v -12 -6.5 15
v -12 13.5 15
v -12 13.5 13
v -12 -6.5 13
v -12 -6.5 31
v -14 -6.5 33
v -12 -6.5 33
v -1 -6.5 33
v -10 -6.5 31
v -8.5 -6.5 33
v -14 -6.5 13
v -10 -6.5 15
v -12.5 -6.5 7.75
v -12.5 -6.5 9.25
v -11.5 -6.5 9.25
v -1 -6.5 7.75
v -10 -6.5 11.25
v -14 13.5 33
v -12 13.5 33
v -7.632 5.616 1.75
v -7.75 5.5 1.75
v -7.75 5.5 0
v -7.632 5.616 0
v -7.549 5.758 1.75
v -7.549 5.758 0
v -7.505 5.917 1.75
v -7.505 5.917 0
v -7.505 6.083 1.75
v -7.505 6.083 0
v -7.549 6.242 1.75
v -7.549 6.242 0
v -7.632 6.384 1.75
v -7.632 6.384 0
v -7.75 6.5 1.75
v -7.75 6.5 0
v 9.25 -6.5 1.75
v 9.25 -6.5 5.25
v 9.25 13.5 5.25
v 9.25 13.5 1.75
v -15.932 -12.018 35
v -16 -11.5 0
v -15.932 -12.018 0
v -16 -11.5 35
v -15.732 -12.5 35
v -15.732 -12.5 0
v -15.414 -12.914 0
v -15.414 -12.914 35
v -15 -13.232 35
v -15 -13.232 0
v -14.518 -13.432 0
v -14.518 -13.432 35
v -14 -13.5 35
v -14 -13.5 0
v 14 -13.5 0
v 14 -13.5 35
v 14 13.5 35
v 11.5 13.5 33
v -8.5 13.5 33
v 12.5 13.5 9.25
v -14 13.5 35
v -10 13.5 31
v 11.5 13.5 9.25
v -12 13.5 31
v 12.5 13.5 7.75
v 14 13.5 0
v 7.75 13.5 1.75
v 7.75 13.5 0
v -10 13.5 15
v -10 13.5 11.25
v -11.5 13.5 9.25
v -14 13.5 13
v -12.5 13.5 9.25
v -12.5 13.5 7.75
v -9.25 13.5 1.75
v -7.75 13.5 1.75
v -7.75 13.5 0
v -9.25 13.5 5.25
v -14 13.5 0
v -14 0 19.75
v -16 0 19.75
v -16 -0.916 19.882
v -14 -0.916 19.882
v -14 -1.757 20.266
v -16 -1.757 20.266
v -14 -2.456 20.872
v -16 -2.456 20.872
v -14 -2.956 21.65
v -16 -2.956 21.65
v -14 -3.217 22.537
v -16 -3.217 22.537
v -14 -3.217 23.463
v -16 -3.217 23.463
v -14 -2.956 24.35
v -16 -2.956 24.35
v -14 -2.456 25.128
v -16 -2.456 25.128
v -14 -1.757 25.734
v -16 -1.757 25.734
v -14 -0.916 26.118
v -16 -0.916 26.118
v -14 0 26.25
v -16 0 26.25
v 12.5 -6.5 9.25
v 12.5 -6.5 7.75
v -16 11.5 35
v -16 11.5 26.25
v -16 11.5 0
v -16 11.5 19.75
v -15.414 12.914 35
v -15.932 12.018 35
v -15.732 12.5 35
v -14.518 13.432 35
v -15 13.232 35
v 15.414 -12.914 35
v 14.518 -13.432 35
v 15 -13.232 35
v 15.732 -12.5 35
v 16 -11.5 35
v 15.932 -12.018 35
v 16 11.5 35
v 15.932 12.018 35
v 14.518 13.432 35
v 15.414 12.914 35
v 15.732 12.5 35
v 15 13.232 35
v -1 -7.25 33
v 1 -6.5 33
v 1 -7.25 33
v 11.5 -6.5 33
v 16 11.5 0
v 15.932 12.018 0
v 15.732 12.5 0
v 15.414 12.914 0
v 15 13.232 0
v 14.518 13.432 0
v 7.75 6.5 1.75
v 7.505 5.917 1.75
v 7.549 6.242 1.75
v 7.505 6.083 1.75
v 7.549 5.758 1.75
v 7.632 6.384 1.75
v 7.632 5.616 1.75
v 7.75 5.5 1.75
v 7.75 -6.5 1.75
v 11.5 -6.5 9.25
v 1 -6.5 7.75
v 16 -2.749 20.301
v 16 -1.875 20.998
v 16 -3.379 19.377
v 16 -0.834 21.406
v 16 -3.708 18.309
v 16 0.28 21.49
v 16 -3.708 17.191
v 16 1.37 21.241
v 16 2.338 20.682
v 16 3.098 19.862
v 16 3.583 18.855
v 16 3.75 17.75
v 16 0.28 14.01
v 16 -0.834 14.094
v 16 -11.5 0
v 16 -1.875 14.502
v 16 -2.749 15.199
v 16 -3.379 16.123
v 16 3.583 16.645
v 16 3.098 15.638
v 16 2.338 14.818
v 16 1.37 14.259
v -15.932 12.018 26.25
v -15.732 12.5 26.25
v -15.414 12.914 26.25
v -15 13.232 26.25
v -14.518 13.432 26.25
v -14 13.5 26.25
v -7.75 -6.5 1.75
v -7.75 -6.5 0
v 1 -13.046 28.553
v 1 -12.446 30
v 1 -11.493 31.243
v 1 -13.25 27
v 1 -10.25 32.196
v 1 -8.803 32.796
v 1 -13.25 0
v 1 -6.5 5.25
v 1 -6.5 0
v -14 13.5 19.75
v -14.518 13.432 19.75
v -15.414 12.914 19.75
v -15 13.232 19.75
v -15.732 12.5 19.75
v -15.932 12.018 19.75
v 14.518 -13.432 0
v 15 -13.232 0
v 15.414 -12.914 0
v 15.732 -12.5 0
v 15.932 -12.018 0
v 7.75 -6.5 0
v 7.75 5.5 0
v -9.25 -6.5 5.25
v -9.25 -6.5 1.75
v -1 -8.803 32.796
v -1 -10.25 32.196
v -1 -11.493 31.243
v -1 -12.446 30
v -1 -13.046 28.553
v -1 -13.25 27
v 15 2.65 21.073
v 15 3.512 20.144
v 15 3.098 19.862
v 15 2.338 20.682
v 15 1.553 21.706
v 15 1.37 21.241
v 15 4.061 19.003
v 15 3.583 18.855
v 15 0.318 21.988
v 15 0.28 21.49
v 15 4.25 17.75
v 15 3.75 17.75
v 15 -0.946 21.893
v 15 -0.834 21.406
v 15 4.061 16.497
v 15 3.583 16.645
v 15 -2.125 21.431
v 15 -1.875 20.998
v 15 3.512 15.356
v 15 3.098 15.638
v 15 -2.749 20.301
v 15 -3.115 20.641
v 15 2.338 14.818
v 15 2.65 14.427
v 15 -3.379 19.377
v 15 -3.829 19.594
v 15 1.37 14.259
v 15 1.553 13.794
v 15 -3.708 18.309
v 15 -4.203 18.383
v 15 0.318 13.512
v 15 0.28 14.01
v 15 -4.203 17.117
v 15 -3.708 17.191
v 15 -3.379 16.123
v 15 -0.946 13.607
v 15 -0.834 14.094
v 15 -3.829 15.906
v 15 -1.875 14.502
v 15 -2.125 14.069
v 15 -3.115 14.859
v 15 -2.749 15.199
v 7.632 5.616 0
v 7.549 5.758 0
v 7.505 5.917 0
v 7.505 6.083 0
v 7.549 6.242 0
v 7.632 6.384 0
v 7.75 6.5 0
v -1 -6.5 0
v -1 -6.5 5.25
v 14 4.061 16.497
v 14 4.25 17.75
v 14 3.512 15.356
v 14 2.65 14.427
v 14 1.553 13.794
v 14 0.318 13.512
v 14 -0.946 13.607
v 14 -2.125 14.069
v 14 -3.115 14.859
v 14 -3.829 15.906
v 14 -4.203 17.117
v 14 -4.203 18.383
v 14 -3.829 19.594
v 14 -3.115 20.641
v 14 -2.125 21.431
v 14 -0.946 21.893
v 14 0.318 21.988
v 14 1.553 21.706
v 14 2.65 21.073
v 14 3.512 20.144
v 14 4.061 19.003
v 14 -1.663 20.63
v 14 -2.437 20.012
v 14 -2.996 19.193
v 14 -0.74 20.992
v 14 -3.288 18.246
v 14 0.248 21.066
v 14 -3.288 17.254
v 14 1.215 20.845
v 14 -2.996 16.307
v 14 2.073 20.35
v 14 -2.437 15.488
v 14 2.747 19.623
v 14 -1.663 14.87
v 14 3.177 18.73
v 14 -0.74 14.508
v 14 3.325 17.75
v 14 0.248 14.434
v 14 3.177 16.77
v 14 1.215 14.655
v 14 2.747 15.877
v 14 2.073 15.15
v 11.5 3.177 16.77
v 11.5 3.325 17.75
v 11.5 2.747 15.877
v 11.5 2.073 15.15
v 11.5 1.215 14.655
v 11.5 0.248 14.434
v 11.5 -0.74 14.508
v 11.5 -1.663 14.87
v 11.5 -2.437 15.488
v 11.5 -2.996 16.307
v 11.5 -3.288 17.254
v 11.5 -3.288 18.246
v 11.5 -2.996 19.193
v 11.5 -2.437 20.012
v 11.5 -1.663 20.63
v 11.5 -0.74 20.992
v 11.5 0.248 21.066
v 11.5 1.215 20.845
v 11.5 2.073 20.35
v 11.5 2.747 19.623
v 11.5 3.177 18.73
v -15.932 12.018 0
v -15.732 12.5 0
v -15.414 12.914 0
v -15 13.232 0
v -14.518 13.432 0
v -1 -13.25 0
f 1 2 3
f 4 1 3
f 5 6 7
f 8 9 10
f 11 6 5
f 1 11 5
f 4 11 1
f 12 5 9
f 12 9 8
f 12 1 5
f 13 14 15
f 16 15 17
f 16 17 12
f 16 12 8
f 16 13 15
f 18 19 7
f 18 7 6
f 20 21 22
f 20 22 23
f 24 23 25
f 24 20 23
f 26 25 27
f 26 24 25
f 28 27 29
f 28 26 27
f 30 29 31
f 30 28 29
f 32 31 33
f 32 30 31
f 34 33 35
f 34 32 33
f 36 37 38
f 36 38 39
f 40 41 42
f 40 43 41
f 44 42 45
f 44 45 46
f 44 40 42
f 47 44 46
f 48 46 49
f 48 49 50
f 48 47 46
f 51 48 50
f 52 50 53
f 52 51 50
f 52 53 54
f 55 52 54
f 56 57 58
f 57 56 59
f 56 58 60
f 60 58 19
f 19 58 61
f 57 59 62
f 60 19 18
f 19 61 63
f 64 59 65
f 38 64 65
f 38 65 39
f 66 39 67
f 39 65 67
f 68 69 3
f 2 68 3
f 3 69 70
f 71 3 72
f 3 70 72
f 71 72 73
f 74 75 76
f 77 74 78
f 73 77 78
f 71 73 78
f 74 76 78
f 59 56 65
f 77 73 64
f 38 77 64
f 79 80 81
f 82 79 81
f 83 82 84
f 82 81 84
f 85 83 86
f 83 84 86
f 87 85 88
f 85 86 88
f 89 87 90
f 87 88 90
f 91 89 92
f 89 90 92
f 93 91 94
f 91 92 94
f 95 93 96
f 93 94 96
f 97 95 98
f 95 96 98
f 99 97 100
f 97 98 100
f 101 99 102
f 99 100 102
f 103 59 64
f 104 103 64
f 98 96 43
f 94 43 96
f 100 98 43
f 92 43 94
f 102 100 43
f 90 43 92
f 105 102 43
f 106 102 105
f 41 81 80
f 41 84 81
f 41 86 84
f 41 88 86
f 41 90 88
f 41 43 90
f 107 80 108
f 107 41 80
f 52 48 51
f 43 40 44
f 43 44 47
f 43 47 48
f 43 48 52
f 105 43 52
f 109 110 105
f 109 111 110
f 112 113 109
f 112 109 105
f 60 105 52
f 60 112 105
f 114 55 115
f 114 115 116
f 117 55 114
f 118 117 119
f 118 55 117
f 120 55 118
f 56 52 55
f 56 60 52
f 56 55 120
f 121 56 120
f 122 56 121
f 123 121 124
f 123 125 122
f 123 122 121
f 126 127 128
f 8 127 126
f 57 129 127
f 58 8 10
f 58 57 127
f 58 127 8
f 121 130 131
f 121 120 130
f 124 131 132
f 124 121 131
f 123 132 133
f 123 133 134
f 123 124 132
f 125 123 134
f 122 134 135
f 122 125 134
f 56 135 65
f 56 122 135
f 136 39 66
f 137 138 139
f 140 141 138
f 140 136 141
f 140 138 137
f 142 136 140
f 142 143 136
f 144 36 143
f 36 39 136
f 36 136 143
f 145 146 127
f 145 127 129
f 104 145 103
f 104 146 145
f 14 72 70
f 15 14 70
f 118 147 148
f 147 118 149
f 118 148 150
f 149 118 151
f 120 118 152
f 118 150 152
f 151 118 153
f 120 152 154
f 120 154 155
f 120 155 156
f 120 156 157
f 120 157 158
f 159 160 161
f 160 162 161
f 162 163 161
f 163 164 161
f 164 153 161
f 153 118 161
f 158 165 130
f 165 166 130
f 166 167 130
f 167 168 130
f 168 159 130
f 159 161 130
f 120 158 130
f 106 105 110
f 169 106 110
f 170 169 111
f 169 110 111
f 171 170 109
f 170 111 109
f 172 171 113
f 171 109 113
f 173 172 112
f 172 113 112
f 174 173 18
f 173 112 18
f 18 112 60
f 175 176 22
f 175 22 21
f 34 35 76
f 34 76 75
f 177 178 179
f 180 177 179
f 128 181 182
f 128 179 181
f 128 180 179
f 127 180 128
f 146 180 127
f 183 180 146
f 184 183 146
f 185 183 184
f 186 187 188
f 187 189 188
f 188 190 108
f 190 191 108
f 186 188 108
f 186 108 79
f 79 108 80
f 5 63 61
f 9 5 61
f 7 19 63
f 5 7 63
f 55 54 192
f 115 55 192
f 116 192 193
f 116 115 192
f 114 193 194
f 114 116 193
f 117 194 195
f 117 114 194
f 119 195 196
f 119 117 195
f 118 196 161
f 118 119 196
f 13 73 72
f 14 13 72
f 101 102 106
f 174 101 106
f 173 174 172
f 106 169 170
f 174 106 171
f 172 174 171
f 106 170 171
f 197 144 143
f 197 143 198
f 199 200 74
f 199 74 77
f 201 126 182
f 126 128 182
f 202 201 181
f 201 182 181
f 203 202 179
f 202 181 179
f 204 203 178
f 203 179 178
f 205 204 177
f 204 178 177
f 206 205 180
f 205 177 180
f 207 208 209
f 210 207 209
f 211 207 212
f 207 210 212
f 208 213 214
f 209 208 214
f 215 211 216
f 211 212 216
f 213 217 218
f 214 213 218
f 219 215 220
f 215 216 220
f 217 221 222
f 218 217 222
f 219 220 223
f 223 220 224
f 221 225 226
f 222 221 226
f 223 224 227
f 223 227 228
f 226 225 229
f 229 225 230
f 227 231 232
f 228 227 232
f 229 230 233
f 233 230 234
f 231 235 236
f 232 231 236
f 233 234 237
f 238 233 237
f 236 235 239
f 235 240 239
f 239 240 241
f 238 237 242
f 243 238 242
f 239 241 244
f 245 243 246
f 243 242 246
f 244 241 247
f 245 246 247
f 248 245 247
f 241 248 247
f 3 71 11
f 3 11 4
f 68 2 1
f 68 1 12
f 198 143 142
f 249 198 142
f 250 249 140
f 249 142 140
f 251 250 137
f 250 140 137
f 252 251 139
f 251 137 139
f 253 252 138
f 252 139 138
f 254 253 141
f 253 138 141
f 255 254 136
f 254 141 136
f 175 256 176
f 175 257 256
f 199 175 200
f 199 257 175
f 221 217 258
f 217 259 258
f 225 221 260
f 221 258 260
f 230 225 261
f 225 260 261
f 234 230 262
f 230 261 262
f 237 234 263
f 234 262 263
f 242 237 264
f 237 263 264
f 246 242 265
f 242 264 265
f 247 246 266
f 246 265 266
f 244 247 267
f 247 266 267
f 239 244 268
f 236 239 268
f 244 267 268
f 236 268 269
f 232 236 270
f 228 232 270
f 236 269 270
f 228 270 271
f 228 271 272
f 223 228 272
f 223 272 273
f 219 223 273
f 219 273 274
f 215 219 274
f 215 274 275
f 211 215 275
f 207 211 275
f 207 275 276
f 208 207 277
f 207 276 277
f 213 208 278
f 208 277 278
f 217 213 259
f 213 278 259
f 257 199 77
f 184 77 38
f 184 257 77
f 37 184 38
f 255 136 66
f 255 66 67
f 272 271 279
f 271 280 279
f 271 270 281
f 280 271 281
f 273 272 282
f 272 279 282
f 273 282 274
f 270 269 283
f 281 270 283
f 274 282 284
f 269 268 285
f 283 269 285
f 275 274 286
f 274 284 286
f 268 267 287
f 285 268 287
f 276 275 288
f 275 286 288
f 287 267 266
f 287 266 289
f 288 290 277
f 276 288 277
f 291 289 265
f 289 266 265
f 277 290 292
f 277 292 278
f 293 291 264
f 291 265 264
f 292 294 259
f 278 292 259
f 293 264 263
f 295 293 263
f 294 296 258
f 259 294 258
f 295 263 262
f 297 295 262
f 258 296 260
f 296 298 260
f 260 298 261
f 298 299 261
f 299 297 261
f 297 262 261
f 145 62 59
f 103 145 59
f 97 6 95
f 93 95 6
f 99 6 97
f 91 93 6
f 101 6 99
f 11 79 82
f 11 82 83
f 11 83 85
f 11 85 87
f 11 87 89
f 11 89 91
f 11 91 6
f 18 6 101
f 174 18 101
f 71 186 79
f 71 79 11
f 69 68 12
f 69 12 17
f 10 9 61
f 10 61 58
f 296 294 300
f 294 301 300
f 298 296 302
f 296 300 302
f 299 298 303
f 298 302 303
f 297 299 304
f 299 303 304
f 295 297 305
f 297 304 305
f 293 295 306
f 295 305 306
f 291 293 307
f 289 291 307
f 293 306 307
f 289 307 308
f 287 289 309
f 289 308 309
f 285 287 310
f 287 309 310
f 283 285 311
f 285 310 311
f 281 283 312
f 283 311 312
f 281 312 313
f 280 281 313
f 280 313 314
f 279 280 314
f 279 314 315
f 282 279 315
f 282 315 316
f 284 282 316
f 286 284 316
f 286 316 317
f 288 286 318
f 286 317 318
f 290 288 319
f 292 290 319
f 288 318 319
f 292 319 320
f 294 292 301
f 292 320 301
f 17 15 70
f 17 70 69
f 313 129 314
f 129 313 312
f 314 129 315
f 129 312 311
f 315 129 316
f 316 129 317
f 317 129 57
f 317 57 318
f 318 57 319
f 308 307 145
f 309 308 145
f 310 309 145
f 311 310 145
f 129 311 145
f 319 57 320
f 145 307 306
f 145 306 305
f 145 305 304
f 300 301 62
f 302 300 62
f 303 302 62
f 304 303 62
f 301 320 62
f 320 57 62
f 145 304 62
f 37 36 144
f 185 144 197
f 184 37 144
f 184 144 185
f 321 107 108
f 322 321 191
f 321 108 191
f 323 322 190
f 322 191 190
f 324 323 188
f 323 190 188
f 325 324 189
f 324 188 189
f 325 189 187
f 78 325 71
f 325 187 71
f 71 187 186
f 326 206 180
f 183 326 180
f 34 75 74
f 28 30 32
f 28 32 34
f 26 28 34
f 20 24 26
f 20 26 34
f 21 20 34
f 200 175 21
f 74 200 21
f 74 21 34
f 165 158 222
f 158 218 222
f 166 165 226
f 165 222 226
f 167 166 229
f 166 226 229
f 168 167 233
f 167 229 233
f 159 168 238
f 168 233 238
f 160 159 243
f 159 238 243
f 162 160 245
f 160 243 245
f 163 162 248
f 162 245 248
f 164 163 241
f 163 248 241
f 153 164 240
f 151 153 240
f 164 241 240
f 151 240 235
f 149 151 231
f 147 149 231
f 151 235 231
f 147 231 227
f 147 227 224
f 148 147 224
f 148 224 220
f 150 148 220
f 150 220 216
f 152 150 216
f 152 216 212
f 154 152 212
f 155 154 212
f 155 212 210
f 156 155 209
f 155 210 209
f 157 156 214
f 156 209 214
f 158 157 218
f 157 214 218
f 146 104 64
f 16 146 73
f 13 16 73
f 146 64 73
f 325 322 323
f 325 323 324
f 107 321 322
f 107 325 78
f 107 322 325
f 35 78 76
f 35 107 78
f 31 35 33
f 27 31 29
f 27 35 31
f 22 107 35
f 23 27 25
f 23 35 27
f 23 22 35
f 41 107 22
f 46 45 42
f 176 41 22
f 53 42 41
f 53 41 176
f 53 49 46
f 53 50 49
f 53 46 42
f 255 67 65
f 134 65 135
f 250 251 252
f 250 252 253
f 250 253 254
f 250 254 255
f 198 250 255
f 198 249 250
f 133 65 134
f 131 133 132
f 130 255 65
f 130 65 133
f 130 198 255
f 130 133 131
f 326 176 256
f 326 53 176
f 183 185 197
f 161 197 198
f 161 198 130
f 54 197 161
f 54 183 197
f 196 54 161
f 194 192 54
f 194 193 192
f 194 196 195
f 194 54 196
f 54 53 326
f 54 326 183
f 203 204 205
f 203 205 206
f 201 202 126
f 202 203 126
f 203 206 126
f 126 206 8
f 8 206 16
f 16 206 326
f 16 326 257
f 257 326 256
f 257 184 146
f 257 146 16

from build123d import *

# Parameters (mm, degrees)
SKETCH1_W               = 32
SKETCH1_H               = 27
BOSS_EXTRUDE1_DEPTH     = 35
FILLET1_R               = 2
CUT_EXTRUDE1_DEPTH      = 1
CUT_EXTRUDE1_DEPTH_BACK = 28
BOSS_EXTRUDE2_DEPTH     = 7
BOSS_EXTRUDE3_DEPTH     = 1.75
SKETCH5_W               = 2
SKETCH5_H               = 7
CUT_EXTRUDE2_DEPTH      = 33
CUT_EXTRUDE3_DEPTH      = 20
SKETCH7_W               = 2
SKETCH7_H               = 33
BOSS_EXTRUDE4_DEPTH     = 0.25
FILLET2_R               = 6
CUT_EXTRUDE5_DEPTH      = 4.5
SKETCH14_W              = 2.5
SKETCH14_H              = 20
CUT_EXTRUDE6_DEPTH      = 20
SKETCH16_W              = 2
SKETCH16_H              = 3.75
SKETCH16_H_2            = 2
BOSS_EXTRUDE5_DEPTH     = 20
BOSS_EXTRUDE6_DEPTH     = 20


with BuildPart() as part:
    # Sketch1 → Boss-Extrude1 (new body)
    with BuildSketch(Plane.XY):
        Rectangle(SKETCH1_W, SKETCH1_H)
    extrude(amount=BOSS_EXTRUDE1_DEPTH)

    # Fillet1
    fillet1_edges = [part.edges().sort_by_distance(p)[0] for p in [
        (16, -13.5, 17.5),
        (-16, -13.5, 17.5),
        (-16, 13.5, 17.5),
        (16, 13.5, 17.5),
    ]]
    fillet(fillet1_edges, radius=FILLET1_R)

    # Sketch2 → Cut-Extrude1 (cut, two sides)
    with BuildSketch(Plane.XZ.offset(13.5)) as cut_extrude1_sk:
        Polygon((-7.75, 0), (-7.75, 1.75), (-9.25, 1.75), (-9.25, 5.25), (9.25, 5.25), (9.25, 1.75), (7.75, 1.75), (7.75, 0), align=None)
    extrude(amount=CUT_EXTRUDE1_DEPTH, mode=Mode.SUBTRACT)
    extrude(cut_extrude1_sk.sketch, amount=-CUT_EXTRUDE1_DEPTH_BACK, mode=Mode.SUBTRACT)

    # Sketch3 → Boss-Extrude2 (add)
    with BuildSketch(Plane.XZ.offset(13.5)):
        Polygon((-7.75, 0), (-7.75, 1.75), (-9.25, 1.75), (-9.25, 5.25), (9.25, 5.25), (9.25, 1.75), (7.75, 1.75), (7.75, 0), align=None)
    extrude(amount=-BOSS_EXTRUDE2_DEPTH)

    # Sketch4 → Boss-Extrude3 (add)
    with BuildSketch(Plane(origin=(0, 0, 1.75), x_dir=(-1, 0, 0), z_dir=(0, 0, -1))):
        with BuildLine():
            Line((-7.75, 6.5), (-7.75, 5.5))
            ThreePointArc((-7.75, 5.5), (-7.5, 6), (-7.75, 6.5))
        make_face()
    boss_extrude3 = extrude(amount=BOSS_EXTRUDE3_DEPTH)

    # Mirror1: Boss-Extrude3 across plane
    add(boss_extrude3.mirror(Plane(origin=(0, 0, 0), x_dir=(0, 0, 1), z_dir=(1, 0, 0))))

    # Sketch5 → Cut-Extrude2 (cut)
    with BuildSketch(Plane(origin=(0, 0, 0), x_dir=(-1, 0, 0), z_dir=(0, 0, -1))):
        with Locations((0, -10)):
            Rectangle(SKETCH5_W, SKETCH5_H)
    extrude(amount=-CUT_EXTRUDE2_DEPTH, mode=Mode.SUBTRACT)

    # Sketch6 → Cut-Extrude3 (cut)
    with BuildSketch(Plane(origin=(0, 13.5, 0), x_dir=(1, 0, 0), z_dir=(0, 1, 0))):
        Polygon((-12.5, -7.75), (-12.5, -9.25), (-11.5, -9.25), (-11.5, -33), (11.5, -33), (11.5, -9.25), (12.5, -9.25), (12.5, -7.75), align=None)
    extrude(amount=-CUT_EXTRUDE3_DEPTH, mode=Mode.SUBTRACT)

    # Sketch7 → Boss-Extrude4 (add)
    with BuildSketch(Plane.XZ.offset(13.5)):
        with Locations((0, 16.5)):
            Rectangle(SKETCH7_W, SKETCH7_H)
    extrude(amount=-BOSS_EXTRUDE4_DEPTH)

    # Fillet2
    fillet2_edges = [part.edges().sort_by_distance(p)[0] for p in [
        (0, -13.25, 33),
    ]]
    fillet(fillet2_edges, radius=FILLET2_R)

    # Sketch9 → Cut-Revolve1 (revolve, cut)
    with BuildSketch(Plane(origin=(0, 0, 17.75), x_dir=(-1, 0, 0), z_dir=(0, 0, -1))):
        Polygon((-15, 4.25), (-14, 4.25), (-14, 3.325), (-11.5, 3.325), (-11.5, 0), (-16, 0), (-16, 3.75), (-15, 3.75), align=None)
    revolve(axis=Axis((16, 0, 17.75), (-1, 0, 0)), mode=Mode.SUBTRACT)

    # Sketch11 → Cut-Extrude5 (cut)
    with BuildSketch(Plane(origin=(-16, 0, 44), x_dir=(0, 0, -1), z_dir=(1, 0, 0))):
        with BuildLine():
            Line((24.25, 23), (24.25, 0))
            ThreePointArc((24.25, 0), (21, -3.25), (17.75, 0))
            Line((17.75, 0), (17.75, 23))
            ThreePointArc((17.75, 23), (21, 26.25), (24.25, 23))
        make_face()
    extrude(amount=CUT_EXTRUDE5_DEPTH, mode=Mode.SUBTRACT)

    # Sketch14 → Cut-Extrude6 (cut)
    with BuildSketch(Plane(origin=(0, 13.5, 0), x_dir=(1, 0, 0), z_dir=(0, 1, 0))):
        with Locations((-12.75, -23)):
            Rectangle(SKETCH14_W, SKETCH14_H)
    extrude(amount=-CUT_EXTRUDE6_DEPTH, mode=Mode.SUBTRACT)

    # Sketch16 → Boss-Extrude5 (add)
    with BuildSketch(Plane(origin=(0, 13.5, 0), x_dir=(1, 0, 0), z_dir=(0, 1, 0))):
        with Locations((-11, -13.125)):
            Rectangle(SKETCH16_W, SKETCH16_H)
        with Locations((-11, -32)):
            Rectangle(SKETCH16_W, SKETCH16_H_2)
    extrude(amount=-BOSS_EXTRUDE5_DEPTH)

    # Sketch20 → Boss-Extrude6 (add)
    with BuildSketch(Plane(origin=(0, 13.5, 0), x_dir=(1, 0, 0), z_dir=(0, 1, 0))):
        Polygon((-11.5, -9.25), (-10, -11.25), (-11.5, -11.25), align=None)
        Polygon((-10, -31), (-8.5, -33), (-10, -33), align=None)
    extrude(amount=-BOSS_EXTRUDE6_DEPTH)


solid = part.part
